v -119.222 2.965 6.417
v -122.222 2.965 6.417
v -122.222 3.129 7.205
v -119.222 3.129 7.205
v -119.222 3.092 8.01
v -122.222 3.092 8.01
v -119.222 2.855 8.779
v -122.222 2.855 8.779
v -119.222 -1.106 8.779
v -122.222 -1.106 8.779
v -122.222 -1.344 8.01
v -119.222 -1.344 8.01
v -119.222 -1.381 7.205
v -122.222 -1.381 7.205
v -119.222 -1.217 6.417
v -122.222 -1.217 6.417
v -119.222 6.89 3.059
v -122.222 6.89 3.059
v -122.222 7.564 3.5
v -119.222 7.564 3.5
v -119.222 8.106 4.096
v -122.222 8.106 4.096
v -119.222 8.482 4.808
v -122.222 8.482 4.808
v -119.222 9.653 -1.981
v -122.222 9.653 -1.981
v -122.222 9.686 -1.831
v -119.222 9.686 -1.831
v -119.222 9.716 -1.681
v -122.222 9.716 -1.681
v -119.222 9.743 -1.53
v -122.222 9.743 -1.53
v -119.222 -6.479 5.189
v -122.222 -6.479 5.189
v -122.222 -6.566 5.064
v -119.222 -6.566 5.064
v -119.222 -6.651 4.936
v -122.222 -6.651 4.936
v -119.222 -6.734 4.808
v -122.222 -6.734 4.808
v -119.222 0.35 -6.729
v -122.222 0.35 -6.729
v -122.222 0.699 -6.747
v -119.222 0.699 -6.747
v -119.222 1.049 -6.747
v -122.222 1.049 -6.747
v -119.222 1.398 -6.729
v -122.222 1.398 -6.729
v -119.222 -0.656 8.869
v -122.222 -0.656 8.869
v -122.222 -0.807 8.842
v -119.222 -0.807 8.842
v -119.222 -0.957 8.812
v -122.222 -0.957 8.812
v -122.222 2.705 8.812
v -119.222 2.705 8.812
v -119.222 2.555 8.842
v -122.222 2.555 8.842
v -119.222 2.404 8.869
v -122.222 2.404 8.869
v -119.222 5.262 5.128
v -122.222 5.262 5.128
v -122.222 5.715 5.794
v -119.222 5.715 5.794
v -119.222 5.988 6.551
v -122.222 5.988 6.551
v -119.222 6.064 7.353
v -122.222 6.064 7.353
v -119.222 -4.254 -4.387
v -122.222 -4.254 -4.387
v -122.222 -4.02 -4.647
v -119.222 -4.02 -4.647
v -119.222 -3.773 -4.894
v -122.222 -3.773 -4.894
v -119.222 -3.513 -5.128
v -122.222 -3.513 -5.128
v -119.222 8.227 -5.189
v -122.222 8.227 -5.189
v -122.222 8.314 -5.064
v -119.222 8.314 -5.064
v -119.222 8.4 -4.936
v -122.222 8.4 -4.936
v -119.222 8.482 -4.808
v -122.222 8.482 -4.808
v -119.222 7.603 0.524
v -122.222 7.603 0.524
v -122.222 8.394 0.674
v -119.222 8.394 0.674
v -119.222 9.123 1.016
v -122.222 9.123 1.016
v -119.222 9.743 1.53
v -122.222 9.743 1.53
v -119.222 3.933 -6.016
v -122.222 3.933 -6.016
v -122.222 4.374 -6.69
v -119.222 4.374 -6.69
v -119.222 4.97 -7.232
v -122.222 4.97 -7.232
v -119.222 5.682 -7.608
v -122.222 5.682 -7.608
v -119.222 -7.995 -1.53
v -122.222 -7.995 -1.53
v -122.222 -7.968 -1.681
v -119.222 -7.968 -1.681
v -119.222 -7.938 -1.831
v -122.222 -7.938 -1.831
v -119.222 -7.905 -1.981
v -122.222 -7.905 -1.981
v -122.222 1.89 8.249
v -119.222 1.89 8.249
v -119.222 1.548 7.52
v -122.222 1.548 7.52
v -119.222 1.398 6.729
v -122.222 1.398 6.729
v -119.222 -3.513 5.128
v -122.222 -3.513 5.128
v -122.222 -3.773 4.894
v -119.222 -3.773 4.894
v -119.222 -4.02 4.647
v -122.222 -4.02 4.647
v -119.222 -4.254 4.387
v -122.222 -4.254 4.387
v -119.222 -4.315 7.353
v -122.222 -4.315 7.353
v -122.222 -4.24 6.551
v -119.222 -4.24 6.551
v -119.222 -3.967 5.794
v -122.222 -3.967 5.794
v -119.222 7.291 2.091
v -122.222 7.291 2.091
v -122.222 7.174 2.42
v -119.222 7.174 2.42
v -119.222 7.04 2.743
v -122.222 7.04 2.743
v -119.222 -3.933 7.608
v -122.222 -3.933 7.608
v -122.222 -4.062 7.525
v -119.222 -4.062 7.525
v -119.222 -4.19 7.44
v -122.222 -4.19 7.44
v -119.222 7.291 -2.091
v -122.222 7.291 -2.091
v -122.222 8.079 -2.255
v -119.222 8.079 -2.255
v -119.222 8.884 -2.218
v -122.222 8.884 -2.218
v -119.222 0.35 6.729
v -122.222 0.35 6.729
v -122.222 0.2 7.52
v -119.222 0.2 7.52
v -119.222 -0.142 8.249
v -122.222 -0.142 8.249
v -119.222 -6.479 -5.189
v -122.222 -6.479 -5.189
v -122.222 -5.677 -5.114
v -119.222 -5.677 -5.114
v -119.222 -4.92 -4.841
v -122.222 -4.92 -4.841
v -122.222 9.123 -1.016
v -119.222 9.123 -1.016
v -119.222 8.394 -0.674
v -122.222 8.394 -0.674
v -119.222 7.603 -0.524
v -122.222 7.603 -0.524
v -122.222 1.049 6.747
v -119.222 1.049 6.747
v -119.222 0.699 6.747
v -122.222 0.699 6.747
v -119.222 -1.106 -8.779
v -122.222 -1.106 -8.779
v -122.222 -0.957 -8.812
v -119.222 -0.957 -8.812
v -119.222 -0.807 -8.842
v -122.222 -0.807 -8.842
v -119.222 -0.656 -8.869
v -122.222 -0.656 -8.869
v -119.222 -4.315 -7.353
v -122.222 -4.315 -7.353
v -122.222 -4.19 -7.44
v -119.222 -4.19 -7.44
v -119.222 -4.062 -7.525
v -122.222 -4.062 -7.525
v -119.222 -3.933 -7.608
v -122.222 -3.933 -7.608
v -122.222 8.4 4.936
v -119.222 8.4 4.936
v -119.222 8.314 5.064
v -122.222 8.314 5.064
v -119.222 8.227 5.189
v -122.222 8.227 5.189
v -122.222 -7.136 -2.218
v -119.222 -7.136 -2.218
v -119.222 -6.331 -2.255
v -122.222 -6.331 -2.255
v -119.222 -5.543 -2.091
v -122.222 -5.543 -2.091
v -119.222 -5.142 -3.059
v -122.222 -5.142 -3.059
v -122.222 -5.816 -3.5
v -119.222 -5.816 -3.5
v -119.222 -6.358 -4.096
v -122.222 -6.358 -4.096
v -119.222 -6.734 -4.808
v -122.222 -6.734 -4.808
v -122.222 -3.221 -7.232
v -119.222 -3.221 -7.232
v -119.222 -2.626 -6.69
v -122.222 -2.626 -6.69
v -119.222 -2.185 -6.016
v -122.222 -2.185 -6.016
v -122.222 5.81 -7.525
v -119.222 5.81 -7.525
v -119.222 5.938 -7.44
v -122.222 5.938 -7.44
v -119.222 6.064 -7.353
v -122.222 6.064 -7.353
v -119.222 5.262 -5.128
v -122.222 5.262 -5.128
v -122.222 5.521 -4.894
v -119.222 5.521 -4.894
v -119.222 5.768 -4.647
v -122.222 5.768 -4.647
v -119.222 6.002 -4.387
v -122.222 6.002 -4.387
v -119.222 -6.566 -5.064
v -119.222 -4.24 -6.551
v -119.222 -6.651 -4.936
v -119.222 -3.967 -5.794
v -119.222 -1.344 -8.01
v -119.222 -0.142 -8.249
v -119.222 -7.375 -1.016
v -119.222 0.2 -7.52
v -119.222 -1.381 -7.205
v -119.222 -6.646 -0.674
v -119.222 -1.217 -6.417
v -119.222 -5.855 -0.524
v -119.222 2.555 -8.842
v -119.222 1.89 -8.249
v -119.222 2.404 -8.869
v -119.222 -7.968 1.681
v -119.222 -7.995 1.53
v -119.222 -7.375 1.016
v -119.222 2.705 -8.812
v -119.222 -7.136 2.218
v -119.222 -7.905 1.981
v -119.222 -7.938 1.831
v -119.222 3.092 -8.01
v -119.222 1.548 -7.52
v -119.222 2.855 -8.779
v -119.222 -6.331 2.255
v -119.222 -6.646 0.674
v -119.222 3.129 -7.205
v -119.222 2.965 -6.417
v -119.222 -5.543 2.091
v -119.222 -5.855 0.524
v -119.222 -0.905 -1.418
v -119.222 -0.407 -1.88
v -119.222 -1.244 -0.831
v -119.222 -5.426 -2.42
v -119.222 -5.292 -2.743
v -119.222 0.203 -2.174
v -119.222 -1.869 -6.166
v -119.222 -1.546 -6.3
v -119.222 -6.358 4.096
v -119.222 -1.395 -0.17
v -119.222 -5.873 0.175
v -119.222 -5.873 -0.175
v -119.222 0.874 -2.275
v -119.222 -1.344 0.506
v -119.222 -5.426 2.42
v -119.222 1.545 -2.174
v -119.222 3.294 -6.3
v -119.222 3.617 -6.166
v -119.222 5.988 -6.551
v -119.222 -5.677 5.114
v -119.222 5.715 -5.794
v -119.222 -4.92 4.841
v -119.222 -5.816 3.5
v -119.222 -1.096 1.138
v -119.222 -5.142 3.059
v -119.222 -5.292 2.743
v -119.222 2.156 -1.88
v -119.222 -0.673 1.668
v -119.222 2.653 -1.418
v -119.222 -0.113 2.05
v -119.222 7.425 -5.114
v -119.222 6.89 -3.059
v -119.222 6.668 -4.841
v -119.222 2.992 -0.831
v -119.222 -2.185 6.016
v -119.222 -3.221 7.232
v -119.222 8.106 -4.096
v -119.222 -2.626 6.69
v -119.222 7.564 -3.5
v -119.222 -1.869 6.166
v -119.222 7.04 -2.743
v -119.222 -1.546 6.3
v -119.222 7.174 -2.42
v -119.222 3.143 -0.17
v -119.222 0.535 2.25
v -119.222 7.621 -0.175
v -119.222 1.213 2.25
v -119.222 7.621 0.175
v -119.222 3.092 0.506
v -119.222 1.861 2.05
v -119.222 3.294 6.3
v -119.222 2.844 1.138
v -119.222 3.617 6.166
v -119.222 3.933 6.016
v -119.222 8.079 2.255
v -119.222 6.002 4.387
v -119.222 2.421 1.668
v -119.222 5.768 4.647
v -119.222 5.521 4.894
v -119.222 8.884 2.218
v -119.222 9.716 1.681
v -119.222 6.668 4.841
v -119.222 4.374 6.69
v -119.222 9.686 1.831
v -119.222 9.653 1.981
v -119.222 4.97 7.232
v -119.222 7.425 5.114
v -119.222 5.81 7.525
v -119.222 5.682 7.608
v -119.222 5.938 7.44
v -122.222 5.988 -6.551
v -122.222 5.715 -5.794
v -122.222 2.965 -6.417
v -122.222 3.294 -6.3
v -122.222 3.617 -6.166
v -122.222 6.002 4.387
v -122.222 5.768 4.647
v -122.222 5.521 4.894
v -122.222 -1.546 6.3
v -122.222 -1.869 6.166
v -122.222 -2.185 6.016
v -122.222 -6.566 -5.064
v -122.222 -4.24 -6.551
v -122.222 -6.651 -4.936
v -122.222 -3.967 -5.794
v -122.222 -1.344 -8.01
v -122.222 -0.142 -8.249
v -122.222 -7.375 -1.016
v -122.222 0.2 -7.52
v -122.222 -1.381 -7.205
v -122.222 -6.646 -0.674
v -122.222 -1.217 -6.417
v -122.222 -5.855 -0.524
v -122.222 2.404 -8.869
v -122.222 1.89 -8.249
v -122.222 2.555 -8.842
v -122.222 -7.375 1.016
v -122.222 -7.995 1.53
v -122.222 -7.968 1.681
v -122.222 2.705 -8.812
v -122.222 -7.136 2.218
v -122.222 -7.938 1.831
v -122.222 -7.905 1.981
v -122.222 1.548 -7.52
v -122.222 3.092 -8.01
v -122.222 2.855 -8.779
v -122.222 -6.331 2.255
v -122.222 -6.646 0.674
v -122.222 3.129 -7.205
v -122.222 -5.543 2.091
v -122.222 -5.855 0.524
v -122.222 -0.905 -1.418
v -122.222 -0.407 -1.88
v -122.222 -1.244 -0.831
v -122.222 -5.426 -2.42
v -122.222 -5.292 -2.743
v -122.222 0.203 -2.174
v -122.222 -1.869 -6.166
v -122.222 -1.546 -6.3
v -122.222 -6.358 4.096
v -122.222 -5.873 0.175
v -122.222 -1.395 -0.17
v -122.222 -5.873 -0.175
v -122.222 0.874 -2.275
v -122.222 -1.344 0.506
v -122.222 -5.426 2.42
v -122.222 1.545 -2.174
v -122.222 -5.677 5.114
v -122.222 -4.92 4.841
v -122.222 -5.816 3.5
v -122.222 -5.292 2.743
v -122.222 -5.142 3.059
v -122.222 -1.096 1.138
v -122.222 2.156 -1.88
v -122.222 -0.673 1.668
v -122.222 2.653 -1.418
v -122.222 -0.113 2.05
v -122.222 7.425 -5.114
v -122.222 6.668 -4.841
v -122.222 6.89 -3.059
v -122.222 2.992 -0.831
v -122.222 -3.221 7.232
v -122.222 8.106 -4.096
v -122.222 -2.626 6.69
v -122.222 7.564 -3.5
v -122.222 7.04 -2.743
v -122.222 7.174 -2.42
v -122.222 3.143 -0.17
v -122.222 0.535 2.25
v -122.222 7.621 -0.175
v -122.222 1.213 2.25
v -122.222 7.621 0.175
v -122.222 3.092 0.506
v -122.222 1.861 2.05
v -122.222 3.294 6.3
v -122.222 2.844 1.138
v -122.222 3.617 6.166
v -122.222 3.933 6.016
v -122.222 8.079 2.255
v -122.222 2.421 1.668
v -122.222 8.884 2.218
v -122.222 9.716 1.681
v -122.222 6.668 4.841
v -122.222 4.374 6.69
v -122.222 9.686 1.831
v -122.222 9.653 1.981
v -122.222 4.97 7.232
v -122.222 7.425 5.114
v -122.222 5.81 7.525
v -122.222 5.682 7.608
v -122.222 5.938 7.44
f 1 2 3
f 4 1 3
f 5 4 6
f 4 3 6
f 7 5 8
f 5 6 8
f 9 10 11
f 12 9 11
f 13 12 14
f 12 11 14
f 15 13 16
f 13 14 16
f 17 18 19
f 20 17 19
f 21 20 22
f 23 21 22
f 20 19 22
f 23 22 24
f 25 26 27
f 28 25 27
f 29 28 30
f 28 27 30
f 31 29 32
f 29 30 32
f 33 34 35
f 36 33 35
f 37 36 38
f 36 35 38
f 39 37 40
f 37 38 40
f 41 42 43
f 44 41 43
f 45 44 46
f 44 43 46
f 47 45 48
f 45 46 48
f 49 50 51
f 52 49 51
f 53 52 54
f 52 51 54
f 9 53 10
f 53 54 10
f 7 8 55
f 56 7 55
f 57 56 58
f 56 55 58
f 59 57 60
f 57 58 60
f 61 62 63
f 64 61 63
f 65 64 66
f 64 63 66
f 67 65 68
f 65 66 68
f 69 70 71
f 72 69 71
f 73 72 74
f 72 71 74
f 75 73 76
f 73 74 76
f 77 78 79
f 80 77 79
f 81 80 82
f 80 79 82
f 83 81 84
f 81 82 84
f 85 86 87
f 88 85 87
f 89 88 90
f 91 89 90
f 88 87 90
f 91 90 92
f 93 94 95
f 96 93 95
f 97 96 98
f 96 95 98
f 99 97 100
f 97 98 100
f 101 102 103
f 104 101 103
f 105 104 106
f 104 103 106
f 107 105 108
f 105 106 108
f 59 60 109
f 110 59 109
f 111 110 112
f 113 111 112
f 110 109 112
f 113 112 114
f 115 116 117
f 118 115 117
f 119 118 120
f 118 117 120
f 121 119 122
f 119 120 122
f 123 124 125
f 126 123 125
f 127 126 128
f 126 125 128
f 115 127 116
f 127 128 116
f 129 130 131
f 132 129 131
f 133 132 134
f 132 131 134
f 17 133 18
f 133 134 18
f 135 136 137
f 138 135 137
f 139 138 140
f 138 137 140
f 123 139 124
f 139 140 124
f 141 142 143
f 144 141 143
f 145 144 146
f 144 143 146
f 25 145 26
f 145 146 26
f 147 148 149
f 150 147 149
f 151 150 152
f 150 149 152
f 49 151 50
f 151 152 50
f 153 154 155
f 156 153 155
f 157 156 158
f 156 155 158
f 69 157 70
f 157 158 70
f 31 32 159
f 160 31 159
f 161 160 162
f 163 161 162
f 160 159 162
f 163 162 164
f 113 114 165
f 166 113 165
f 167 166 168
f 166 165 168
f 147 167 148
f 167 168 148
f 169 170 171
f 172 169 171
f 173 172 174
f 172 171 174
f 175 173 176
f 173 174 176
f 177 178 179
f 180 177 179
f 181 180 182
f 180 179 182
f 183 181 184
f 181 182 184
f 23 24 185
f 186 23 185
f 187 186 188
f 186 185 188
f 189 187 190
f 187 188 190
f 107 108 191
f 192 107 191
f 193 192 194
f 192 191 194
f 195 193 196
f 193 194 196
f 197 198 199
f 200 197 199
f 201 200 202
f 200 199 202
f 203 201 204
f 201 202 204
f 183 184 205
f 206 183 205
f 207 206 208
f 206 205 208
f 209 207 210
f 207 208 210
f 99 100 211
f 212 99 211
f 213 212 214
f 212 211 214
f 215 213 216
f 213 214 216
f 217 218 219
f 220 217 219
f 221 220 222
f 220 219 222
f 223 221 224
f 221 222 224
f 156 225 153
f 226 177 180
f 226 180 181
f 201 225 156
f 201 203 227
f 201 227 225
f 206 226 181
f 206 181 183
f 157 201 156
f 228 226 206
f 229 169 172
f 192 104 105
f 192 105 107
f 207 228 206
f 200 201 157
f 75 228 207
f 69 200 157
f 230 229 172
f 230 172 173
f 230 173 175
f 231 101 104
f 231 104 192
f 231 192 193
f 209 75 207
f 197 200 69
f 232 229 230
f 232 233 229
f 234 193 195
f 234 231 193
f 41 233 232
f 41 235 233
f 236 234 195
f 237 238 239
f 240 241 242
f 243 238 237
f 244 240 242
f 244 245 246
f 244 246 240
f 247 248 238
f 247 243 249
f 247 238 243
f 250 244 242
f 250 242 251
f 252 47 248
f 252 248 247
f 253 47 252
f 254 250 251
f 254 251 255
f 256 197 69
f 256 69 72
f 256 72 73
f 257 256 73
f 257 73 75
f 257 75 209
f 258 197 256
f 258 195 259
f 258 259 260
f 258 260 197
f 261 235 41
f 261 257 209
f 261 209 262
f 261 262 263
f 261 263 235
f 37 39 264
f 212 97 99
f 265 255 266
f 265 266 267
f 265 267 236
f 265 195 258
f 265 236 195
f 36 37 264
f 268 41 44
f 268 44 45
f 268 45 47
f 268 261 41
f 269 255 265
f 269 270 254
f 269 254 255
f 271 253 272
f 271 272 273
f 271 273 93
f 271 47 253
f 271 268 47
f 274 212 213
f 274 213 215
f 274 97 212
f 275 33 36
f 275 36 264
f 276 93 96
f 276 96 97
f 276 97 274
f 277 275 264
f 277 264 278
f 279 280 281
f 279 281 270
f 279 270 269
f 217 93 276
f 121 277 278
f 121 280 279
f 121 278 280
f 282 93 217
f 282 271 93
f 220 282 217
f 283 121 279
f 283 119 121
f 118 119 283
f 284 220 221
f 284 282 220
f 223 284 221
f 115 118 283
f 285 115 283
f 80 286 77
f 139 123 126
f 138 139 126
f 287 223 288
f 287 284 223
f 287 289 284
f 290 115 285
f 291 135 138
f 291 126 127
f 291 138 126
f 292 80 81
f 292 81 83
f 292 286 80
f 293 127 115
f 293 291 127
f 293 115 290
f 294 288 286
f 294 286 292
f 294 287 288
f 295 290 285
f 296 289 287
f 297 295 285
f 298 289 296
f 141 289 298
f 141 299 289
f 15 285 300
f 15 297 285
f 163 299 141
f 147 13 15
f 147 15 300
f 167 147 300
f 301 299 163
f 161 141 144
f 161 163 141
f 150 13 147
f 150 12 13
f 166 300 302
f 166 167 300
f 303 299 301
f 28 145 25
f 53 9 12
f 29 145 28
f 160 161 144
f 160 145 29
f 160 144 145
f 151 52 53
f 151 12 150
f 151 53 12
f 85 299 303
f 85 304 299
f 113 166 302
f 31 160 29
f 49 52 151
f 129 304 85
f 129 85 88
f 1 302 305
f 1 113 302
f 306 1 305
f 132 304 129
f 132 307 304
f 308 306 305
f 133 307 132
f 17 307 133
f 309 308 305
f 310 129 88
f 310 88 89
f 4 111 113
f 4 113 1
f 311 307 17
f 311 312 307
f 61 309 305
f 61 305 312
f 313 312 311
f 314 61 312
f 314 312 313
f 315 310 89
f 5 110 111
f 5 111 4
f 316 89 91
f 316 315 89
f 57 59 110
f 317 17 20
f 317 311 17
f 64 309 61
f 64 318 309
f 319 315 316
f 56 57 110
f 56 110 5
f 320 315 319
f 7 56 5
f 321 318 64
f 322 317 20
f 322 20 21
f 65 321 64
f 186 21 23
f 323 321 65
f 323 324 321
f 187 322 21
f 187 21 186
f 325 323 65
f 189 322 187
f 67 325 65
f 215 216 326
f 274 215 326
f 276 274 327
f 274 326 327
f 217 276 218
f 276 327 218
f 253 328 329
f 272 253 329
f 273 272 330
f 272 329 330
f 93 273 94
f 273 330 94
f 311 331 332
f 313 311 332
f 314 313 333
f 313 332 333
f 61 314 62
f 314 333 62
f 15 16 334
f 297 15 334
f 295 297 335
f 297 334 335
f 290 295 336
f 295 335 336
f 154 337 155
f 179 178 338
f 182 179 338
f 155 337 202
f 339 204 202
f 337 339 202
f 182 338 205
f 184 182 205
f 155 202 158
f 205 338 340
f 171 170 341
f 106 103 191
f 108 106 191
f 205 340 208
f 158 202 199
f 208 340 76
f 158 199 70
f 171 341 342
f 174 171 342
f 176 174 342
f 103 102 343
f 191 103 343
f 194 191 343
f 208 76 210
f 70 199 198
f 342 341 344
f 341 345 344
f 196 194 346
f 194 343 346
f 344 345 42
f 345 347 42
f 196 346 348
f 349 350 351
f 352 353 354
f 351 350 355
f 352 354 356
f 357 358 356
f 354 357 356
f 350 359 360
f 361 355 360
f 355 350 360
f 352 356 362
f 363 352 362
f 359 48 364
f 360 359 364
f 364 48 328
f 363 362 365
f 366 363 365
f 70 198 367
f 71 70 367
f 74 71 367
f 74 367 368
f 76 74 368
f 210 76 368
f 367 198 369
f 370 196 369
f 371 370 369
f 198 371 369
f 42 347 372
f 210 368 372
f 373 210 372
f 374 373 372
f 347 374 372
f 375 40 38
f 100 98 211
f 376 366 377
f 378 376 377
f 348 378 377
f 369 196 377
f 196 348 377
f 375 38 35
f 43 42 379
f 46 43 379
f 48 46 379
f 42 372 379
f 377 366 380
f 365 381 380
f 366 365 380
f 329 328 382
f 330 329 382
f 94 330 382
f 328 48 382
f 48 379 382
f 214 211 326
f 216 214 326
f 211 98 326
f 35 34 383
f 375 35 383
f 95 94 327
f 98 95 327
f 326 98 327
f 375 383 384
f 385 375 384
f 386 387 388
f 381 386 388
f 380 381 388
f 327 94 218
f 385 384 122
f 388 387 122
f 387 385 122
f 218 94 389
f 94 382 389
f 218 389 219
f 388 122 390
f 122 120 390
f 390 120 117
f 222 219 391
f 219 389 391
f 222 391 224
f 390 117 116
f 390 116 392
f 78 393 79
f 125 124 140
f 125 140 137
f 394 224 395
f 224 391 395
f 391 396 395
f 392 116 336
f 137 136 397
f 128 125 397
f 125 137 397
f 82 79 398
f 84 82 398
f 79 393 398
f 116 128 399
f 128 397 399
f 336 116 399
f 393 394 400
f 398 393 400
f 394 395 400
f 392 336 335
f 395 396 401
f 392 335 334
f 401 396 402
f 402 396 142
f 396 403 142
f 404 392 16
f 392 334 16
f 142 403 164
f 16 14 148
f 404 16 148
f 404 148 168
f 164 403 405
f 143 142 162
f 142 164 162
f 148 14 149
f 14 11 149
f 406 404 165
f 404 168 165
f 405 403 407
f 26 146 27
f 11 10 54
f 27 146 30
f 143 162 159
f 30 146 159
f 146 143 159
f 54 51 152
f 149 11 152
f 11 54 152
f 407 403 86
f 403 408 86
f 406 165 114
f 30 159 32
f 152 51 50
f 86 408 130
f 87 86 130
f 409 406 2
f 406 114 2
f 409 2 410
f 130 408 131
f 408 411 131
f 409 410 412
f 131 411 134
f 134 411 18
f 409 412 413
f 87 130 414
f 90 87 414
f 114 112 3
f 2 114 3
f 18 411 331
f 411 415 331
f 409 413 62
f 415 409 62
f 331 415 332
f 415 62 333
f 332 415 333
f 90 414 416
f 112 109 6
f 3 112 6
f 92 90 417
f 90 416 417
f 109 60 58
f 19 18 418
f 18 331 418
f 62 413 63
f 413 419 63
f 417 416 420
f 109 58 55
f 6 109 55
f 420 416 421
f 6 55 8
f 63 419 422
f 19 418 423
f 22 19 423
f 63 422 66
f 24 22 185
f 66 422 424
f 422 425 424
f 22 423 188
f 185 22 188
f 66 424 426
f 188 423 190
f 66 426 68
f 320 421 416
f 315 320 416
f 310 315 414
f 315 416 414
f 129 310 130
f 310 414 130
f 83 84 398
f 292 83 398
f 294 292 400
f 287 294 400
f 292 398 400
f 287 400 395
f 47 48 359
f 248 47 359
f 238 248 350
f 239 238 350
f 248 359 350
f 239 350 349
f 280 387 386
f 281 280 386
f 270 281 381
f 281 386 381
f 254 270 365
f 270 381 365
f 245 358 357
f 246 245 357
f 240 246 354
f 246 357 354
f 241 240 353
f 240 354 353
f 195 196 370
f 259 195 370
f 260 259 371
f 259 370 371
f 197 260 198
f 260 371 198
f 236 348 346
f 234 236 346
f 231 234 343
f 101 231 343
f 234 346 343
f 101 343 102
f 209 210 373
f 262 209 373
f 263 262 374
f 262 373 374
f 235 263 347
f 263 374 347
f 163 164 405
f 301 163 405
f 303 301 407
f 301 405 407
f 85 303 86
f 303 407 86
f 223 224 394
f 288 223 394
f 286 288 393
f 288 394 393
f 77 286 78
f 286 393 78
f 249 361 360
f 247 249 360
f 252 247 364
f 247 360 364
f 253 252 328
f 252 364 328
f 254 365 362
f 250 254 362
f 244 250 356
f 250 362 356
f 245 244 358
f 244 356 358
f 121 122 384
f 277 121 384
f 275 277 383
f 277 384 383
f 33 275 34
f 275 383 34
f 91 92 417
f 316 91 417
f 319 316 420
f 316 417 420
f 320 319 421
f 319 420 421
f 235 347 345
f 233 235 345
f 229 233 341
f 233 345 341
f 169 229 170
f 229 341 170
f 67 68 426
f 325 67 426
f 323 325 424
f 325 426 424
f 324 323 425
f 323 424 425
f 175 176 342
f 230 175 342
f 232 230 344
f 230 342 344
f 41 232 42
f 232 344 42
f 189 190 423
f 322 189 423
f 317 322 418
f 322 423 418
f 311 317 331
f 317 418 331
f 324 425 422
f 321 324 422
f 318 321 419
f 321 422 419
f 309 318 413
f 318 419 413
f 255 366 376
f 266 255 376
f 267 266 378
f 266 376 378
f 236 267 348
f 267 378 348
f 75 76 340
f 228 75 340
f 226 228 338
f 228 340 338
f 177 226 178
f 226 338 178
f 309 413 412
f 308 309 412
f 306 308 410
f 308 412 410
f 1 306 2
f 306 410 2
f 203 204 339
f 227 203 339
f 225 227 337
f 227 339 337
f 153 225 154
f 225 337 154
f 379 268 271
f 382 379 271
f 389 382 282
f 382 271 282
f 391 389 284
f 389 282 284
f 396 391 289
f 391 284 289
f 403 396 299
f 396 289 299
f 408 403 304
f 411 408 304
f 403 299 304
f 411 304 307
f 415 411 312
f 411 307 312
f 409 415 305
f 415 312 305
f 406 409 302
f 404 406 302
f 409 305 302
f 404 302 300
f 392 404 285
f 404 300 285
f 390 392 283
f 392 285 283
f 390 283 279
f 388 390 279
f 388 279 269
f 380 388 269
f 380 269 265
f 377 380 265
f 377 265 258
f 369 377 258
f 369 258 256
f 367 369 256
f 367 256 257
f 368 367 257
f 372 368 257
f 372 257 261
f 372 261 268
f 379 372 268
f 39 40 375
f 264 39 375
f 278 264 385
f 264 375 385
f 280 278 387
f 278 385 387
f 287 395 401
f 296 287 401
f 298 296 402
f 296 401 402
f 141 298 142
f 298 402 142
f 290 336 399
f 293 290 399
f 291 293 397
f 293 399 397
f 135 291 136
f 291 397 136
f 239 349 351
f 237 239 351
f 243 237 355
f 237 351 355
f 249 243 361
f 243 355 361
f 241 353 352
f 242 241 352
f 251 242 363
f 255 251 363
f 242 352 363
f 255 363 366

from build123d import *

# Parameters (mm, degrees)
SPUR_START              = -122.221816322
SPUR_GEAR_ISO_OUTLINE_R = 1
SPUR_GEAR_ISO_DEPTH     = 3
SKETCH1_R               = 2.275
CUT_EXTRUDE1_DEPTH      = 10


# Read off the part's stored shape, not the designer's step: spur gear_iso
with BuildPart() as part:
    # spur gear_iso outline → spur gear_iso (new body)
    with BuildSketch(Plane.YZ.offset(SPUR_START)):
        with BuildLine():
            ThreePointArc((2.854590328, 8.779377764), (2.629866412, 8.827067524), (2.403998504, 8.869006051))
            ThreePointArc((2.403998504, 8.869006051), (1.695929768, 7.895188691), (1.397846451, 6.728643397))
            ThreePointArc((1.397846451, 6.728643397), (0.874053513, 6.749), (0.350260576, 6.728643397))
            ThreePointArc((0.350260576, 6.728643397), (0.052177259, 7.895188691), (-0.655891477, 8.869006051))
            ThreePointArc((-0.655891477, 8.869006051), (-0.881759385, 8.827067524), (-1.106483301, 8.779377764))
            ThreePointArc((-1.106483301, 8.779377764), (-1.387989744, 7.608721662), (-1.216965263, 6.416902795))
            ThreePointArc((-1.216965263, 6.416902795), (-1.708676972, 6.235262965), (-2.184808411, 6.016009037))
            ThreePointArc((-2.184808411, 6.016009037), (-2.906619044, 6.97968481), (-3.933453026, 7.608408563))
            ThreePointArc((-3.933453026, 7.608408563), (-4.126078584, 7.483226511), (-4.315446329, 7.353168799))
            ThreePointArc((-4.315446329, 7.353168799), (-4.127533675, 6.163895735), (-3.513438322, 5.128246912))
            ThreePointArc((-3.513438322, 5.128246912), (-3.898210152, 4.772263666), (-4.254193398, 4.387491836))
            ThreePointArc((-4.254193398, 4.387491836), (-5.289842221, 5.001587189), (-6.479115285, 5.189499843))
            ThreePointArc((-6.479115285, 5.189499843), (-6.609172997, 5.000132097), (-6.73435505, 4.80750654))
            ThreePointArc((-6.73435505, 4.80750654), (-6.105631296, 3.780672557), (-5.141955523, 3.058861924))
            ThreePointArc((-5.141955523, 3.058861924), (-5.361209451, 2.582730485), (-5.542849281, 2.091018776))
            ThreePointArc((-5.542849281, 2.091018776), (-6.734668149, 2.262043257), (-7.905324251, 1.980536814))
            ThreePointArc((-7.905324251, 1.980536814), (-7.95301401, 1.755812898), (-7.994952537, 1.529944991))
            ThreePointArc((-7.994952537, 1.529944991), (-7.021135177, 0.821876255), (-5.854589883, 0.523792937))
            ThreePointArc((-5.854589883, 0.523792937), (-5.874946486, 0), (-5.854589883, -0.523792937))
            ThreePointArc((-5.854589883, -0.523792937), (-7.021135177, -0.821876255), (-7.994952537, -1.529944991))
            ThreePointArc((-7.994952537, -1.529944991), (-7.95301401, -1.755812898), (-7.905324251, -1.980536814))
            ThreePointArc((-7.905324251, -1.980536814), (-6.734668149, -2.262043257), (-5.542849281, -2.091018776))
            ThreePointArc((-5.542849281, -2.091018776), (-5.361209451, -2.582730485), (-5.141955523, -3.058861924))
            ThreePointArc((-5.141955523, -3.058861924), (-6.105631296, -3.780672557), (-6.73435505, -4.80750654))
            ThreePointArc((-6.73435505, -4.80750654), (-6.609172997, -5.000132097), (-6.479115285, -5.189499843))
            ThreePointArc((-6.479115285, -5.189499843), (-5.289842221, -5.001587189), (-4.254193398, -4.387491836))
            ThreePointArc((-4.254193398, -4.387491836), (-3.898210153, -4.772263667), (-3.513438322, -5.128246912))
            ThreePointArc((-3.513438322, -5.128246912), (-4.127533675, -6.163895735), (-4.315446329, -7.353168799))
            ThreePointArc((-4.315446329, -7.353168799), (-4.126078584, -7.483226511), (-3.933453026, -7.608408563))
            ThreePointArc((-3.933453026, -7.608408563), (-2.906619044, -6.97968481), (-2.184808411, -6.016009037))
            ThreePointArc((-2.184808411, -6.016009037), (-1.708676972, -6.235262965), (-1.216965263, -6.416902795))
            ThreePointArc((-1.216965263, -6.416902795), (-1.387989744, -7.608721662), (-1.106483301, -8.779377764))
            ThreePointArc((-1.106483301, -8.779377764), (-0.881759385, -8.827067524), (-0.655891477, -8.869006051))
            ThreePointArc((-0.655891477, -8.869006051), (0.052177259, -7.895188691), (0.350260576, -6.728643397))
            ThreePointArc((0.350260576, -6.728643397), (0.874053513, -6.749), (1.397846451, -6.728643397))
            ThreePointArc((1.397846451, -6.728643397), (1.695929768, -7.895188691), (2.403998504, -8.869006051))
            ThreePointArc((2.403998504, -8.869006051), (2.629866412, -8.827067524), (2.854590328, -8.779377764))
            ThreePointArc((2.854590328, -8.779377764), (3.136096771, -7.608721662), (2.96507229, -6.416902795))
            ThreePointArc((2.96507229, -6.416902795), (3.456783999, -6.235262965), (3.932915438, -6.016009037))
            ThreePointArc((3.932915438, -6.016009037), (4.654726071, -6.97968481), (5.681560054, -7.608408563))
            ThreePointArc((5.681560054, -7.608408563), (5.874185611, -7.483226511), (6.063553357, -7.353168799))
            ThreePointArc((6.063553357, -7.353168799), (5.875640702, -6.163895735), (5.26154535, -5.128246912))
            ThreePointArc((5.26154535, -5.128246912), (5.64631718, -4.772263666), (6.002300425, -4.387491836))
            ThreePointArc((6.002300425, -4.387491836), (7.037949248, -5.001587189), (8.227222312, -5.189499843))
            ThreePointArc((8.227222312, -5.189499843), (8.357280024, -5.000132097), (8.482462077, -4.80750654))
            ThreePointArc((8.482462077, -4.80750654), (7.853738324, -3.780672557), (6.89006255, -3.058861924))
            ThreePointArc((6.89006255, -3.058861924), (7.109316479, -2.582730485), (7.290956308, -2.091018776))
            ThreePointArc((7.290956308, -2.091018776), (8.482775176, -2.262043257), (9.653431278, -1.980536814))
            ThreePointArc((9.653431278, -1.980536814), (9.701121037, -1.755812898), (9.743059564, -1.529944991))
            ThreePointArc((9.743059564, -1.529944991), (8.769242204, -0.821876255), (7.60269691, -0.523792937))
            ThreePointArc((7.60269691, -0.523792937), (7.623053514, 0), (7.60269691, 0.523792937))
            ThreePointArc((7.60269691, 0.523792937), (8.769242204, 0.821876255), (9.743059564, 1.529944991))
            ThreePointArc((9.743059564, 1.529944991), (9.701121037, 1.755812898), (9.653431278, 1.980536814))
            ThreePointArc((9.653431278, 1.980536814), (8.482775176, 2.262043257), (7.290956308, 2.091018776))
            ThreePointArc((7.290956308, 2.091018776), (7.109316479, 2.582730485), (6.89006255, 3.058861924))
            ThreePointArc((6.89006255, 3.058861924), (7.853738324, 3.780672557), (8.482462077, 4.80750654))
            ThreePointArc((8.482462077, 4.80750654), (8.357280024, 5.000132097), (8.227222312, 5.189499843))
            ThreePointArc((8.227222312, 5.189499843), (7.037949248, 5.001587189), (6.002300425, 4.387491836))
            ThreePointArc((6.002300425, 4.387491836), (5.64631718, 4.772263666), (5.26154535, 5.128246912))
            ThreePointArc((5.26154535, 5.128246912), (5.875640702, 6.163895735), (6.063553357, 7.353168799))
            ThreePointArc((6.063553357, 7.353168799), (5.874185611, 7.483226511), (5.681560054, 7.608408563))
            ThreePointArc((5.681560054, 7.608408563), (4.654726071, 6.97968481), (3.932915438, 6.016009037))
            ThreePointArc((3.932915438, 6.016009037), (3.456783999, 6.235262965), (2.96507229, 6.416902795))
            ThreePointArc((2.96507229, 6.416902795), (3.136096771, 7.608721662), (2.854590328, 8.779377764))
        make_face()
        with Locations((0.874053514, 0)):
            Circle(SPUR_GEAR_ISO_OUTLINE_R, mode=Mode.SUBTRACT)
    extrude(amount=SPUR_GEAR_ISO_DEPTH)

    # Sketch1 → Cut-Extrude1 (cut)
    with BuildSketch(Plane(origin=(-119.221816322, 0, 0), x_dir=(0, 0, -1), z_dir=(1, 0, 0))):
        with Locations((0, 0.874053514)):
            Circle(SKETCH1_R)
    extrude(amount=-CUT_EXTRUDE1_DEPTH, mode=Mode.SUBTRACT)


solid = part.part
